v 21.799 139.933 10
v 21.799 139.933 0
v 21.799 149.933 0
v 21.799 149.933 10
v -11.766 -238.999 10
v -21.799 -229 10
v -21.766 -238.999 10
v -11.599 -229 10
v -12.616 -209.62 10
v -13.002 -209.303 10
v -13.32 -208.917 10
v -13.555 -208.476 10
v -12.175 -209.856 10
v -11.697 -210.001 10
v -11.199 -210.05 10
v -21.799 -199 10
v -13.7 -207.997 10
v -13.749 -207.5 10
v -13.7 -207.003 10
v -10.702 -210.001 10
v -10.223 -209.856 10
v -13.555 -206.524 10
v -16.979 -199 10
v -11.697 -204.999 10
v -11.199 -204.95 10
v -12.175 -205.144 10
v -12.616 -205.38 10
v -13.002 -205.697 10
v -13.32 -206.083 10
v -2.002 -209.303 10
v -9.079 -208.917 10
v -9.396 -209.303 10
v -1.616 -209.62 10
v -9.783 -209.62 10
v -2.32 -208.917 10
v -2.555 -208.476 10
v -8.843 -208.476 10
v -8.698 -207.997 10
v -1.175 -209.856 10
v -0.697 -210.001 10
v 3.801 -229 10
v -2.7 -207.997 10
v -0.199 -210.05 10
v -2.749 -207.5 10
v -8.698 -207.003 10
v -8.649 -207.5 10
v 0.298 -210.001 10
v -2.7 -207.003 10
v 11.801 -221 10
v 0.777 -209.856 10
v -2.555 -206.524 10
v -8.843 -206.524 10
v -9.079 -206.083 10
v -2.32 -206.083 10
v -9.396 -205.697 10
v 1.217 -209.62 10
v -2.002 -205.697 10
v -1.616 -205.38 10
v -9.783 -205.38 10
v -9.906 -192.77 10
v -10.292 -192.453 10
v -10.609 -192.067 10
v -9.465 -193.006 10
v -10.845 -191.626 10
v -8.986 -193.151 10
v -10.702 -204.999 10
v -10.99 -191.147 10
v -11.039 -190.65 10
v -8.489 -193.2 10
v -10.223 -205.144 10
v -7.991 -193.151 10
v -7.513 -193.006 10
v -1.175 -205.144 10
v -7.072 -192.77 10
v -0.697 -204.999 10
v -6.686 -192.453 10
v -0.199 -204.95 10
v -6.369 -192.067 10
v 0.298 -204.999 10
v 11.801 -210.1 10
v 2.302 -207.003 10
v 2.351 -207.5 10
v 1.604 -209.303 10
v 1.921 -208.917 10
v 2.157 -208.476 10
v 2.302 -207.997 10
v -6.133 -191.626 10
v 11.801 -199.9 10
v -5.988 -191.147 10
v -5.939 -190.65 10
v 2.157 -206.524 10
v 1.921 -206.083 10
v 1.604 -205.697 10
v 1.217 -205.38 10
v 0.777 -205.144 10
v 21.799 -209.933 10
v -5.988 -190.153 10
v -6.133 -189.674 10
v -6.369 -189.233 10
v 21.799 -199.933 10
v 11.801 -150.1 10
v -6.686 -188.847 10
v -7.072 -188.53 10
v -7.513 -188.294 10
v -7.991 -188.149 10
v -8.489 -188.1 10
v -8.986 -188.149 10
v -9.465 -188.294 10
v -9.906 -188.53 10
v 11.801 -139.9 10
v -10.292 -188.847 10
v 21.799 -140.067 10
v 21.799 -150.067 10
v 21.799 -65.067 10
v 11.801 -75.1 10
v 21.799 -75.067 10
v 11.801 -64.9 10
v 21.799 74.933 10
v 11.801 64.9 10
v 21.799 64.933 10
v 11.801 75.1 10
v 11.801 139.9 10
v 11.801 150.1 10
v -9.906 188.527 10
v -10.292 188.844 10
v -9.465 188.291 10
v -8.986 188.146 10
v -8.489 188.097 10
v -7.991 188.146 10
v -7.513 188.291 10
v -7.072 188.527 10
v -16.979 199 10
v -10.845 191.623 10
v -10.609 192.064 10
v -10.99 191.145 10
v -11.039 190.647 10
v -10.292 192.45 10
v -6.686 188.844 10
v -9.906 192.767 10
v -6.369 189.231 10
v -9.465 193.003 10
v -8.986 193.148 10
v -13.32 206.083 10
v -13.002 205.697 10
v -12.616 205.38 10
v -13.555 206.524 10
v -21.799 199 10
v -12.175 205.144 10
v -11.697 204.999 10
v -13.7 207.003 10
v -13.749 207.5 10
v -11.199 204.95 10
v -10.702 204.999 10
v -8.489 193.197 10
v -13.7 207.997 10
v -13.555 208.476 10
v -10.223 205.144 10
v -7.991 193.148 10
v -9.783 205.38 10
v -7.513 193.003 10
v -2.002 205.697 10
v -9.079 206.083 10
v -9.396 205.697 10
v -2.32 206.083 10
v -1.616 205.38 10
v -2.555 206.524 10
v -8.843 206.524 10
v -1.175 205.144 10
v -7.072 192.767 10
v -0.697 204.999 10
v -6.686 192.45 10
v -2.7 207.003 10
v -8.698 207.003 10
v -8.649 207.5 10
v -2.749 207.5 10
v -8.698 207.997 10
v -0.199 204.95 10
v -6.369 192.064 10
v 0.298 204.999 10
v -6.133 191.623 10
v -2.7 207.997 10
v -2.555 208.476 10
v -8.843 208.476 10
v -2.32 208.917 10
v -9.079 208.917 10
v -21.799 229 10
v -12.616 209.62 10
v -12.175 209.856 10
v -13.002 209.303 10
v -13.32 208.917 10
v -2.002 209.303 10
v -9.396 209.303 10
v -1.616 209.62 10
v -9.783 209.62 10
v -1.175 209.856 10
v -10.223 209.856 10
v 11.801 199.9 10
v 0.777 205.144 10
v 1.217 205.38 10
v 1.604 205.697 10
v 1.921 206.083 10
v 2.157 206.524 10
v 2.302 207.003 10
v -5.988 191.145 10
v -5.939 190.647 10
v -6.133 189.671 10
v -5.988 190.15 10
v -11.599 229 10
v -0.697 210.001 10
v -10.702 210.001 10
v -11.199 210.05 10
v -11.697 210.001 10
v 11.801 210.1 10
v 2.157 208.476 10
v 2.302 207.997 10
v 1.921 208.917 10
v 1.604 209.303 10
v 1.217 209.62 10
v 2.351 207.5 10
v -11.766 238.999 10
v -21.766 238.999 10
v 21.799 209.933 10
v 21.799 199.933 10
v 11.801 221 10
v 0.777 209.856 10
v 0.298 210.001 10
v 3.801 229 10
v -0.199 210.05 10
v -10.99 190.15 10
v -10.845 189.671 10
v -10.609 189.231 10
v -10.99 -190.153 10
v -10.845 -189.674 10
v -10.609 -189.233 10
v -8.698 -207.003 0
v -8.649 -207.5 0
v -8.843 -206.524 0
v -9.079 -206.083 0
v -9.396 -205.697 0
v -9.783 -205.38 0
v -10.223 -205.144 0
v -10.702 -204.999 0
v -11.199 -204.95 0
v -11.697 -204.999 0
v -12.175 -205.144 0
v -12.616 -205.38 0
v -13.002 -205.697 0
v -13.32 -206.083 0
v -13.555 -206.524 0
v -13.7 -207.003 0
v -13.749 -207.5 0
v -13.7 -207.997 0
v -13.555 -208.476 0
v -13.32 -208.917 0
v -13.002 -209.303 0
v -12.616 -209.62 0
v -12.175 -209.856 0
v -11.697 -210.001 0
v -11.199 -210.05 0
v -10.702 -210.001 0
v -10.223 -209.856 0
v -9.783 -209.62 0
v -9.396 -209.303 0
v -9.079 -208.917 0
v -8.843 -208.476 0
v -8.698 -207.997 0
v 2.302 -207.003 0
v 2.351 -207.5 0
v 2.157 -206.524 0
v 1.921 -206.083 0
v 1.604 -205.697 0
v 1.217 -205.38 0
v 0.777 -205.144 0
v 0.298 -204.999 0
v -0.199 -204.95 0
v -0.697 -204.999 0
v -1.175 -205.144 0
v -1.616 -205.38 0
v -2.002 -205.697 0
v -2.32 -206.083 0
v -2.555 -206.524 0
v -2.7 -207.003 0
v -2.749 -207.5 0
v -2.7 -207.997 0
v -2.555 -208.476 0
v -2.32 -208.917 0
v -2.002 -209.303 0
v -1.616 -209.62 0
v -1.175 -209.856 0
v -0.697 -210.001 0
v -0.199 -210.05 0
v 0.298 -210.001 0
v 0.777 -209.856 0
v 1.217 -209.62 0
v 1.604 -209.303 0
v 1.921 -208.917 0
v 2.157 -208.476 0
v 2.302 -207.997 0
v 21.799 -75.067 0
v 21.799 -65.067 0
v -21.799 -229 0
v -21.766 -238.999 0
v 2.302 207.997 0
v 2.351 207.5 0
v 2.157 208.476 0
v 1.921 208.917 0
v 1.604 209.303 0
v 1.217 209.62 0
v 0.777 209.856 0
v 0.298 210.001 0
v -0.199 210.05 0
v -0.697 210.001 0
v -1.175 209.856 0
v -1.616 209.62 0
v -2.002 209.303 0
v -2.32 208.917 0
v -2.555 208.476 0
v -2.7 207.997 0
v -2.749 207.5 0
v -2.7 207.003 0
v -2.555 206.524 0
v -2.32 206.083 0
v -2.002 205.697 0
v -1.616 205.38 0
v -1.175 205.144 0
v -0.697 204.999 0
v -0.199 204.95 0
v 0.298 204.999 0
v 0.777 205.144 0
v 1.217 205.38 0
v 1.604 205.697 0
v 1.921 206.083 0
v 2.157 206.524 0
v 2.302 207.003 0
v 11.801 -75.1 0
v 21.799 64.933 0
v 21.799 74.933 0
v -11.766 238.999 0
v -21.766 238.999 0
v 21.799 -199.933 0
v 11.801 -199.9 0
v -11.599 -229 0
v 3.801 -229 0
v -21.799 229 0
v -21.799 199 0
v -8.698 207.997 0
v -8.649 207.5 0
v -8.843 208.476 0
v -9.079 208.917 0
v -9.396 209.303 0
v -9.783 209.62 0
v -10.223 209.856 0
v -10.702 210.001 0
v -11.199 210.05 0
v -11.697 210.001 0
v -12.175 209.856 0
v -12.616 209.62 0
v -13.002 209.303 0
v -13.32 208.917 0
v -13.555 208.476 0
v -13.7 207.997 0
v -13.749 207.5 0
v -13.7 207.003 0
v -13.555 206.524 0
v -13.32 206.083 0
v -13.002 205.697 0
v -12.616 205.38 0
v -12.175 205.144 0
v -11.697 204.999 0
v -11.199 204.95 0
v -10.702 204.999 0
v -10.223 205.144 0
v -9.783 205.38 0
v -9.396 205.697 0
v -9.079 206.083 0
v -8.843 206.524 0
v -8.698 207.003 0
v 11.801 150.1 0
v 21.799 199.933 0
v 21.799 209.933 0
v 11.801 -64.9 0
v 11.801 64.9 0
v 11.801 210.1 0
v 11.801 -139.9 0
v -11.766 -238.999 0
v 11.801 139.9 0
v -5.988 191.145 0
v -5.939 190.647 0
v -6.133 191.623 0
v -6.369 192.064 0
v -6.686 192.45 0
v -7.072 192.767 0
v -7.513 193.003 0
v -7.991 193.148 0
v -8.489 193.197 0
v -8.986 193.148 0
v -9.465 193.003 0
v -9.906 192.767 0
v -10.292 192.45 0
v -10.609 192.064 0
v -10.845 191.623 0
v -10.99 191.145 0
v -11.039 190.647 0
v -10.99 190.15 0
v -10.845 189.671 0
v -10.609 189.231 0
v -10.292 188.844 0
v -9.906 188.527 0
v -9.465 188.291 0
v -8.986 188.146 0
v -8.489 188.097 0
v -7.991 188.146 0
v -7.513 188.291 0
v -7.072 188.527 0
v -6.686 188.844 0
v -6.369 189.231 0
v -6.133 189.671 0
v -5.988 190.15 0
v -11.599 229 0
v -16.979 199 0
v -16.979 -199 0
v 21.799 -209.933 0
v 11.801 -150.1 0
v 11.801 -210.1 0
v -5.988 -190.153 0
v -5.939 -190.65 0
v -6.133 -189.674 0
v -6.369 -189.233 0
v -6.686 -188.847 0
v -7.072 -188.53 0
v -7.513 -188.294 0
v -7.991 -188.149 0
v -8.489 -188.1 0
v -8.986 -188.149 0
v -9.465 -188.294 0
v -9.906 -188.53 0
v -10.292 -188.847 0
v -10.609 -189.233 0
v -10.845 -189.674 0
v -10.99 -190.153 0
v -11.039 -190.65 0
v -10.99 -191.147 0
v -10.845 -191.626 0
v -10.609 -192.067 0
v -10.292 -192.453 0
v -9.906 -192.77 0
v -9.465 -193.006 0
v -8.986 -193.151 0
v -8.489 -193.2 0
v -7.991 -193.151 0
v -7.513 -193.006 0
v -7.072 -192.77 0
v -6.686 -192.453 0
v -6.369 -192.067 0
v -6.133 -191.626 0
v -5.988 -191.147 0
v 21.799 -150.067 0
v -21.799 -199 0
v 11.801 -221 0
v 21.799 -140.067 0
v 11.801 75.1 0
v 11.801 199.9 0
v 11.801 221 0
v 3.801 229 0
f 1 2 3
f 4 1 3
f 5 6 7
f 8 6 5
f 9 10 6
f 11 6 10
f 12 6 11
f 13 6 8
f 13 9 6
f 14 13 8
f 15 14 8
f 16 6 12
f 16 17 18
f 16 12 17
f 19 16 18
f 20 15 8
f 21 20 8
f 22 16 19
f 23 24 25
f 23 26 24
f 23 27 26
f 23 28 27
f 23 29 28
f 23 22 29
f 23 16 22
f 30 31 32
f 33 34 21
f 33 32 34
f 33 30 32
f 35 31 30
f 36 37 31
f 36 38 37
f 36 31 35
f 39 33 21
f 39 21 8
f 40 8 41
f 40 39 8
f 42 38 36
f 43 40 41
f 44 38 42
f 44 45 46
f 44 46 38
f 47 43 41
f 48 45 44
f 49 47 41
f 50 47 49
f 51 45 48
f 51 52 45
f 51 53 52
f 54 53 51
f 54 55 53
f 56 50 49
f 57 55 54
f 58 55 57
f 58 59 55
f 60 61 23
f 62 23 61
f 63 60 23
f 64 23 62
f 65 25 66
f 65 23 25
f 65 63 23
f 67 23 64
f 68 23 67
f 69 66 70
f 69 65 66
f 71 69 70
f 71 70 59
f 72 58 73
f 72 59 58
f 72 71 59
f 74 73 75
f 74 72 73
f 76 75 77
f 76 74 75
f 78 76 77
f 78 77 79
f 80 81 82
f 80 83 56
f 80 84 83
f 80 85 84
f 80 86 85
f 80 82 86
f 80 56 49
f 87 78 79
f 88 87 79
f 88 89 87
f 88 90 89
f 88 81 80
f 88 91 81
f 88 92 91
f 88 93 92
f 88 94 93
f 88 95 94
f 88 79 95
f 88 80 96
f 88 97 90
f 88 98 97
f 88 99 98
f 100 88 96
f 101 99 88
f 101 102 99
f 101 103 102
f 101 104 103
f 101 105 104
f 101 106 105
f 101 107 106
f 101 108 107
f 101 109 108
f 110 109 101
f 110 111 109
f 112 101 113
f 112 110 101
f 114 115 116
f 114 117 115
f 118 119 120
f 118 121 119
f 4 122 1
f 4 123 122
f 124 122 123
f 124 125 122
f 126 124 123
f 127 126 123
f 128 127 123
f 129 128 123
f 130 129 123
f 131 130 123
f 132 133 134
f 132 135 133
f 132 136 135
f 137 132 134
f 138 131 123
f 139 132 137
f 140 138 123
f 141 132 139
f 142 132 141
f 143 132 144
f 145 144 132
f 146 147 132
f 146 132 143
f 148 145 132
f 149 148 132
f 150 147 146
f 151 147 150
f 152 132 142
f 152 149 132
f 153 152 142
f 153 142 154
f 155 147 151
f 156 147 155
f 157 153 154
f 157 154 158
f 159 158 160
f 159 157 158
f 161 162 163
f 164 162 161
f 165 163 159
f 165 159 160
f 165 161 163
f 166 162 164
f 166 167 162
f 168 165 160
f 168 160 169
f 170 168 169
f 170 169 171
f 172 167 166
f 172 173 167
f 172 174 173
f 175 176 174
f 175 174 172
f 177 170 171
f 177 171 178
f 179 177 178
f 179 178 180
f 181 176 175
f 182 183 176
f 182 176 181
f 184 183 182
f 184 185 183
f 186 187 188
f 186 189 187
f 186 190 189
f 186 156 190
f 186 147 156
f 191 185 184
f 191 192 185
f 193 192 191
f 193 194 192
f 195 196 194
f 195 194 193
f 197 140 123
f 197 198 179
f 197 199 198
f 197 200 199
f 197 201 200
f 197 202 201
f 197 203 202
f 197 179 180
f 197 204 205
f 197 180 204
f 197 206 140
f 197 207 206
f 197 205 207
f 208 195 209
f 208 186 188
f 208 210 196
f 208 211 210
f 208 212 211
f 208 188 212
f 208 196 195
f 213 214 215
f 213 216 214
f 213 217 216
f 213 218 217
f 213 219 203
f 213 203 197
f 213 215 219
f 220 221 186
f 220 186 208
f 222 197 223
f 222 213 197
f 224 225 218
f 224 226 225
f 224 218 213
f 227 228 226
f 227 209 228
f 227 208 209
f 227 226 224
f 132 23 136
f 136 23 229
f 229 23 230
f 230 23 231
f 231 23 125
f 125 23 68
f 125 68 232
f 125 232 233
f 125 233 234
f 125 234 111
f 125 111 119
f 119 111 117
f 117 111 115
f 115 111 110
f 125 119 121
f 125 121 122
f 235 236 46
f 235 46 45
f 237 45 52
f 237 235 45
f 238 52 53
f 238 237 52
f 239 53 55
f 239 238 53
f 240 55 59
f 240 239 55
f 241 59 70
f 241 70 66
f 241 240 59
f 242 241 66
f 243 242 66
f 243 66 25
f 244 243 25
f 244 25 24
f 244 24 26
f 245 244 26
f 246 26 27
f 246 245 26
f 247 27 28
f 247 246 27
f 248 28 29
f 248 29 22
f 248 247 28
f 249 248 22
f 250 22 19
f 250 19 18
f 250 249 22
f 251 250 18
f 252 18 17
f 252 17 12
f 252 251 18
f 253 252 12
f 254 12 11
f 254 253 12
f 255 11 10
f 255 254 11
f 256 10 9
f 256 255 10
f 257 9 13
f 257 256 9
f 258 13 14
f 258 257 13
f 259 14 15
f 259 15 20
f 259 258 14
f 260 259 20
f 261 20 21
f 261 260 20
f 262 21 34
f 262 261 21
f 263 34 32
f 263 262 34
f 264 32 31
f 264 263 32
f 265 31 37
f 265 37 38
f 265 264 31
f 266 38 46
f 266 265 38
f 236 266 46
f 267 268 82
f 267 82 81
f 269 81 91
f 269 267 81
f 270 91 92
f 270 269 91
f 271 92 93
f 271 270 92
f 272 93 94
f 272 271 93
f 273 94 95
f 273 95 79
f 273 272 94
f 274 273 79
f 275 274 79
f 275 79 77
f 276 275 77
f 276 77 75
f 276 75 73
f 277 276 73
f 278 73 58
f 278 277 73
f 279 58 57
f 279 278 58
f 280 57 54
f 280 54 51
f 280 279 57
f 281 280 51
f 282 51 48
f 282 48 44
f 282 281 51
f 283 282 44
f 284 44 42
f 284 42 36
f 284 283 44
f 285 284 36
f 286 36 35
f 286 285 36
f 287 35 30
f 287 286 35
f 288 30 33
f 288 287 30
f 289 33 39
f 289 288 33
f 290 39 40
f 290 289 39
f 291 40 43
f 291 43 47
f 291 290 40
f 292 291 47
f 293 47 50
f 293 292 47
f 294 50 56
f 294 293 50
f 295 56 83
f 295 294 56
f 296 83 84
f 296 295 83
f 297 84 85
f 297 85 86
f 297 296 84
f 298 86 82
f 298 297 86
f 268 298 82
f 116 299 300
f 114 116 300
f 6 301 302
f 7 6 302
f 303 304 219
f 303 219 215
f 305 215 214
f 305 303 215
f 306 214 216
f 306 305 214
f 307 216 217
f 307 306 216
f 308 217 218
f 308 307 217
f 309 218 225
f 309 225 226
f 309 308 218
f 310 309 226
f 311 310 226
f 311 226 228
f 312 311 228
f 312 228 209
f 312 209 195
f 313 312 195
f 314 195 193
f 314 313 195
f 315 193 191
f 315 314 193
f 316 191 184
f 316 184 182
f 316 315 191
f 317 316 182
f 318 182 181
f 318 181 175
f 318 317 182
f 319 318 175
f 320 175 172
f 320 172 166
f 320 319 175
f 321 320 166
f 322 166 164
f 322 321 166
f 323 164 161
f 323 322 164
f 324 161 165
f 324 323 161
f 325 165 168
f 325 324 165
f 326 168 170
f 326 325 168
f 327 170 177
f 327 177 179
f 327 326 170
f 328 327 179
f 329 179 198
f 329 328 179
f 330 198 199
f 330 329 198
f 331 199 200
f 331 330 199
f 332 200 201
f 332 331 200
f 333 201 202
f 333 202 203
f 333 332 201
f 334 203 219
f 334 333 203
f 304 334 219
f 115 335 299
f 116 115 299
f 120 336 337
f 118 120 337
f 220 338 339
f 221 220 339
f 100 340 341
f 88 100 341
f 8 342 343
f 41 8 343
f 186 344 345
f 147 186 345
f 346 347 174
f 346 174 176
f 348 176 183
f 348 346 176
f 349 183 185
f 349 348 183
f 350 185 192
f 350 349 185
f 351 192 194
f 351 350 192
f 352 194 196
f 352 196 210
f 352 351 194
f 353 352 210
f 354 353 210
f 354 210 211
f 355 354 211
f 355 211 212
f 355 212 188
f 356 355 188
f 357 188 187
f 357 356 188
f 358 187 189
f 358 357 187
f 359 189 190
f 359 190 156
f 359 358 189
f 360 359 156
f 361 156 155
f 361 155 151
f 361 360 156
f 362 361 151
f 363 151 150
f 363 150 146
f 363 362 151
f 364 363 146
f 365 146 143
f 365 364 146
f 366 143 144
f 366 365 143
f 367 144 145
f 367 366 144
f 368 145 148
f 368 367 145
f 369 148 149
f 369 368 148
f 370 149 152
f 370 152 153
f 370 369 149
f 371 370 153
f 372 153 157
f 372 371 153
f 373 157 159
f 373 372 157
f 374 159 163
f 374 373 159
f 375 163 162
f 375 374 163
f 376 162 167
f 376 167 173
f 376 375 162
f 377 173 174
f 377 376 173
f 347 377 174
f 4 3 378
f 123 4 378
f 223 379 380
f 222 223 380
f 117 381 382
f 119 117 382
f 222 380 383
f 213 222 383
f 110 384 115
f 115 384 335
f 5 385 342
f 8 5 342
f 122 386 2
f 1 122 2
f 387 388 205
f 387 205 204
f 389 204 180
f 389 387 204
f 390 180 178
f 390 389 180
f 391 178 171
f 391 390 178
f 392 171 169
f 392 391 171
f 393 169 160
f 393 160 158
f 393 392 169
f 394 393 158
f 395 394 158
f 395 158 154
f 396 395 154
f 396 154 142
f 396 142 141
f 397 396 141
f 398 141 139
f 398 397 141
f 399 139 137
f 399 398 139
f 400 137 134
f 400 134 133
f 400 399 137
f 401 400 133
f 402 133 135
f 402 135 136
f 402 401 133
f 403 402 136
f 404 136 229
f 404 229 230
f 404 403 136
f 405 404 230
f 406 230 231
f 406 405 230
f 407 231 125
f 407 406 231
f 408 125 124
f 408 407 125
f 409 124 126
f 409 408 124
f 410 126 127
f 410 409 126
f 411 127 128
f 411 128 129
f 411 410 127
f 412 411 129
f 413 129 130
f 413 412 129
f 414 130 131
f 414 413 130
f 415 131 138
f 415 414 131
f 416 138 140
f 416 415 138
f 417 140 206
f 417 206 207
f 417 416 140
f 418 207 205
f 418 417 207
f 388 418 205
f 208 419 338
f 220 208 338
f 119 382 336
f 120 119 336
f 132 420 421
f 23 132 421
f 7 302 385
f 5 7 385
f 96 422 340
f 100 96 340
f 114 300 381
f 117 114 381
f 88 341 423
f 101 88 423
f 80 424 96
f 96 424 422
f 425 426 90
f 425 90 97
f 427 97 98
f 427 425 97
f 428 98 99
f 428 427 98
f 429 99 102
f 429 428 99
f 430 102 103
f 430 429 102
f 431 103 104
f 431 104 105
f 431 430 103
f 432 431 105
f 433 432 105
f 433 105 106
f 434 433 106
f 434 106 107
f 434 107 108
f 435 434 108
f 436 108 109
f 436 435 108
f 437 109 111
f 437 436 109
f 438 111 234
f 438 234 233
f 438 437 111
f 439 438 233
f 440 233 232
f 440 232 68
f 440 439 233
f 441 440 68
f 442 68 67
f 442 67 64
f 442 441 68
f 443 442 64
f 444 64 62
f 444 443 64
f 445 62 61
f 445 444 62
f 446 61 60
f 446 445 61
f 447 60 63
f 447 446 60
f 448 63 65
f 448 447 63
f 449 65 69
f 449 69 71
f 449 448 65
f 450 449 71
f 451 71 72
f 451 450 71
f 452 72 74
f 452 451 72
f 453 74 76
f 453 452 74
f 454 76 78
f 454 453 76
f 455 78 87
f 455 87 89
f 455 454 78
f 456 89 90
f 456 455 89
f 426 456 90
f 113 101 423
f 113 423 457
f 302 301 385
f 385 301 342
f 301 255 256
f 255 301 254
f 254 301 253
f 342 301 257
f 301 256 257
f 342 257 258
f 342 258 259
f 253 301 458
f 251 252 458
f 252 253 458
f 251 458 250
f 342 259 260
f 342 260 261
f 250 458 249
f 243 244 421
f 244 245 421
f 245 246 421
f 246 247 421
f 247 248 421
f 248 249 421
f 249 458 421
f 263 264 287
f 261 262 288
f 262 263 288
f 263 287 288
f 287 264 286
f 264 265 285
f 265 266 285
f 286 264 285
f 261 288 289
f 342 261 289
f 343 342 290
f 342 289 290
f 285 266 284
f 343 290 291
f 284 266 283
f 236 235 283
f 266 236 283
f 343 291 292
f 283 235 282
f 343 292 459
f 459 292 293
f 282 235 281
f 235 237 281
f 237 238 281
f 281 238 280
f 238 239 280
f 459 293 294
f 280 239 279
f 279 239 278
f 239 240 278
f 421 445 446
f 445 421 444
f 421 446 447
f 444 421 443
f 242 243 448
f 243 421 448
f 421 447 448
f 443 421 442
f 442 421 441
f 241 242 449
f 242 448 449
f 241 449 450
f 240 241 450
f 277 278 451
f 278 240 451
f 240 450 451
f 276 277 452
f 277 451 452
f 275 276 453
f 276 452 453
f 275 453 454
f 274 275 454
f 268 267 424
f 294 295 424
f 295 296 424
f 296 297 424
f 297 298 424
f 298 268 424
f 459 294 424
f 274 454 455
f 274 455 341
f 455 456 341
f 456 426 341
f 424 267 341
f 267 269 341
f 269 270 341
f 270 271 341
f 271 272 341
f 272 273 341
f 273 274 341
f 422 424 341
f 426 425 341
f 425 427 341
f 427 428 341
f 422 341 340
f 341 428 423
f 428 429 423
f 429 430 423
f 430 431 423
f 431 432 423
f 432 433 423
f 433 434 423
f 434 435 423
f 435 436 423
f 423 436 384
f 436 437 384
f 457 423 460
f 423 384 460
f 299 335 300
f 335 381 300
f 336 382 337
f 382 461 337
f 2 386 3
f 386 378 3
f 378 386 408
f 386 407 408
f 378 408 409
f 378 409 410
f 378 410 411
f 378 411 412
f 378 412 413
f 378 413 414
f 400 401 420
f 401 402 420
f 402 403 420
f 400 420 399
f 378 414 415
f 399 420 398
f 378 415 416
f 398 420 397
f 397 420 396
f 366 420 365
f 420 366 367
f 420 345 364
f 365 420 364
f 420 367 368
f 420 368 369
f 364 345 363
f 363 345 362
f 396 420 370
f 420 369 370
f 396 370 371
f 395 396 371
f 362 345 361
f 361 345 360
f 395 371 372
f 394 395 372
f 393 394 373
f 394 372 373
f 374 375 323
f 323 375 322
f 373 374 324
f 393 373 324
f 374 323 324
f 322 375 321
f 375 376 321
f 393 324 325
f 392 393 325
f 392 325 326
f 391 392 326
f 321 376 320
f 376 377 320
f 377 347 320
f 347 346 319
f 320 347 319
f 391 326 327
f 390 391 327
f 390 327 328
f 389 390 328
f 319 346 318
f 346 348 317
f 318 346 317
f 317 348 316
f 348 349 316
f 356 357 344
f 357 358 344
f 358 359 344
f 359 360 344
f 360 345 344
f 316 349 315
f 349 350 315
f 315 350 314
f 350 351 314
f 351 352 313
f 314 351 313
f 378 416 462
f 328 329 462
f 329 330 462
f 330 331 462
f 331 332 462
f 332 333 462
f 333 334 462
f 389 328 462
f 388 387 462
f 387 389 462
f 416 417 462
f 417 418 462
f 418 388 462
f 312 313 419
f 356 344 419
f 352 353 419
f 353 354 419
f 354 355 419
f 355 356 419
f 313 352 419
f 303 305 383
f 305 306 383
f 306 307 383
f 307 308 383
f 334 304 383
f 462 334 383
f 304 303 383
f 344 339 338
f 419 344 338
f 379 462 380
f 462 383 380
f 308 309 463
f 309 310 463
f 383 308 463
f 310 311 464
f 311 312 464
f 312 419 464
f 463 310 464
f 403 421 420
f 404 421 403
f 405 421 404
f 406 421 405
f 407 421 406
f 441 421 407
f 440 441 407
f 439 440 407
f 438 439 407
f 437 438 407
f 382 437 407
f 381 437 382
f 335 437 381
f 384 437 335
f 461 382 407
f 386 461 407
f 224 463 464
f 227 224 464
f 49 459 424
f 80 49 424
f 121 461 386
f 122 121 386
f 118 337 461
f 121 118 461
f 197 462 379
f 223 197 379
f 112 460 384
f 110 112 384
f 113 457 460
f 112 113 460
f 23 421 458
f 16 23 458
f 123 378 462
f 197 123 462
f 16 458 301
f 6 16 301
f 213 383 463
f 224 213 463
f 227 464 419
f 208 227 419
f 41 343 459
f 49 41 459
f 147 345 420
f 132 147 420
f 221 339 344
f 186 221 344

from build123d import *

# Parameters (mm, degrees)
SKETCH_1_R      = 2.55
EXTRUDE_1_DEPTH = 10


with BuildPart() as part:
    # Эскиз1 → Бобышка-Вытянуть1 (new body)
    with BuildSketch(Plane.XY):
        Polygon((-16.978606932, 199), (-16.978606932, -199), (-21.7993057, -199), (-21.7993057, -229), (-21.765949224, -238.9986114), (-11.765949224, -238.9986114), (-11.5993057, -229), (3.800694299, -229), (11.800694299, -221), (11.800694299, -210.1), (21.7993057, -209.933356475), (21.7993057, -199.933356475), (11.8006943, -199.899999999), (11.8006943, -173.449999999), (11.8006943, -150.1), (21.799305701, -150.066643523), (21.799305701, -140.066643523), (11.8006943, -139.899999999), (11.8006943, -105.949999999), (11.8006943, -75.099999999), (21.7993057, -75.066643523), (21.7993057, -65.066643523), (11.8006943, -64.899999999), (11.8006943, 64.900000001), (21.7993057, 64.933356477), (21.7993057, 74.933356477), (11.8006943, 75.100000001), (11.8006943, 109.050000001), (11.8006943, 139.900000001), (21.7993057, 139.933356477), (21.7993057, 149.933356477), (11.8006943, 150.100000001), (11.8006943, 176.550000001), (11.8006943, 199.900000001), (21.7993057, 199.933356477), (21.7993057, 209.933356477), (11.8006943, 210.100000001), (11.8006943, 221), (3.8006943, 229), (-11.599305699, 229), (-11.765949224, 238.9986114), (-21.765949224, 238.9986114), (-21.7993057, 229), (-21.7993057, 199), align=None)
        with Locations((-11.199305701, -207.5)):
            Circle(SKETCH_1_R, mode=Mode.SUBTRACT)
        with Locations((-11.199305701, 207.5)):
            Circle(SKETCH_1_R, mode=Mode.SUBTRACT)
        with Locations((-0.199305701, 207.5)):
            Circle(SKETCH_1_R, mode=Mode.SUBTRACT)
        with Locations((-8.488839347, 190.647208967)):
            Circle(SKETCH_1_R, mode=Mode.SUBTRACT)
        with Locations((-0.199305701, -207.5)):
            Circle(SKETCH_1_R, mode=Mode.SUBTRACT)
        with Locations((-8.488839347, -190.65)):
            Circle(SKETCH_1_R, mode=Mode.SUBTRACT)
    extrude(amount=EXTRUDE_1_DEPTH)


solid = part.part
